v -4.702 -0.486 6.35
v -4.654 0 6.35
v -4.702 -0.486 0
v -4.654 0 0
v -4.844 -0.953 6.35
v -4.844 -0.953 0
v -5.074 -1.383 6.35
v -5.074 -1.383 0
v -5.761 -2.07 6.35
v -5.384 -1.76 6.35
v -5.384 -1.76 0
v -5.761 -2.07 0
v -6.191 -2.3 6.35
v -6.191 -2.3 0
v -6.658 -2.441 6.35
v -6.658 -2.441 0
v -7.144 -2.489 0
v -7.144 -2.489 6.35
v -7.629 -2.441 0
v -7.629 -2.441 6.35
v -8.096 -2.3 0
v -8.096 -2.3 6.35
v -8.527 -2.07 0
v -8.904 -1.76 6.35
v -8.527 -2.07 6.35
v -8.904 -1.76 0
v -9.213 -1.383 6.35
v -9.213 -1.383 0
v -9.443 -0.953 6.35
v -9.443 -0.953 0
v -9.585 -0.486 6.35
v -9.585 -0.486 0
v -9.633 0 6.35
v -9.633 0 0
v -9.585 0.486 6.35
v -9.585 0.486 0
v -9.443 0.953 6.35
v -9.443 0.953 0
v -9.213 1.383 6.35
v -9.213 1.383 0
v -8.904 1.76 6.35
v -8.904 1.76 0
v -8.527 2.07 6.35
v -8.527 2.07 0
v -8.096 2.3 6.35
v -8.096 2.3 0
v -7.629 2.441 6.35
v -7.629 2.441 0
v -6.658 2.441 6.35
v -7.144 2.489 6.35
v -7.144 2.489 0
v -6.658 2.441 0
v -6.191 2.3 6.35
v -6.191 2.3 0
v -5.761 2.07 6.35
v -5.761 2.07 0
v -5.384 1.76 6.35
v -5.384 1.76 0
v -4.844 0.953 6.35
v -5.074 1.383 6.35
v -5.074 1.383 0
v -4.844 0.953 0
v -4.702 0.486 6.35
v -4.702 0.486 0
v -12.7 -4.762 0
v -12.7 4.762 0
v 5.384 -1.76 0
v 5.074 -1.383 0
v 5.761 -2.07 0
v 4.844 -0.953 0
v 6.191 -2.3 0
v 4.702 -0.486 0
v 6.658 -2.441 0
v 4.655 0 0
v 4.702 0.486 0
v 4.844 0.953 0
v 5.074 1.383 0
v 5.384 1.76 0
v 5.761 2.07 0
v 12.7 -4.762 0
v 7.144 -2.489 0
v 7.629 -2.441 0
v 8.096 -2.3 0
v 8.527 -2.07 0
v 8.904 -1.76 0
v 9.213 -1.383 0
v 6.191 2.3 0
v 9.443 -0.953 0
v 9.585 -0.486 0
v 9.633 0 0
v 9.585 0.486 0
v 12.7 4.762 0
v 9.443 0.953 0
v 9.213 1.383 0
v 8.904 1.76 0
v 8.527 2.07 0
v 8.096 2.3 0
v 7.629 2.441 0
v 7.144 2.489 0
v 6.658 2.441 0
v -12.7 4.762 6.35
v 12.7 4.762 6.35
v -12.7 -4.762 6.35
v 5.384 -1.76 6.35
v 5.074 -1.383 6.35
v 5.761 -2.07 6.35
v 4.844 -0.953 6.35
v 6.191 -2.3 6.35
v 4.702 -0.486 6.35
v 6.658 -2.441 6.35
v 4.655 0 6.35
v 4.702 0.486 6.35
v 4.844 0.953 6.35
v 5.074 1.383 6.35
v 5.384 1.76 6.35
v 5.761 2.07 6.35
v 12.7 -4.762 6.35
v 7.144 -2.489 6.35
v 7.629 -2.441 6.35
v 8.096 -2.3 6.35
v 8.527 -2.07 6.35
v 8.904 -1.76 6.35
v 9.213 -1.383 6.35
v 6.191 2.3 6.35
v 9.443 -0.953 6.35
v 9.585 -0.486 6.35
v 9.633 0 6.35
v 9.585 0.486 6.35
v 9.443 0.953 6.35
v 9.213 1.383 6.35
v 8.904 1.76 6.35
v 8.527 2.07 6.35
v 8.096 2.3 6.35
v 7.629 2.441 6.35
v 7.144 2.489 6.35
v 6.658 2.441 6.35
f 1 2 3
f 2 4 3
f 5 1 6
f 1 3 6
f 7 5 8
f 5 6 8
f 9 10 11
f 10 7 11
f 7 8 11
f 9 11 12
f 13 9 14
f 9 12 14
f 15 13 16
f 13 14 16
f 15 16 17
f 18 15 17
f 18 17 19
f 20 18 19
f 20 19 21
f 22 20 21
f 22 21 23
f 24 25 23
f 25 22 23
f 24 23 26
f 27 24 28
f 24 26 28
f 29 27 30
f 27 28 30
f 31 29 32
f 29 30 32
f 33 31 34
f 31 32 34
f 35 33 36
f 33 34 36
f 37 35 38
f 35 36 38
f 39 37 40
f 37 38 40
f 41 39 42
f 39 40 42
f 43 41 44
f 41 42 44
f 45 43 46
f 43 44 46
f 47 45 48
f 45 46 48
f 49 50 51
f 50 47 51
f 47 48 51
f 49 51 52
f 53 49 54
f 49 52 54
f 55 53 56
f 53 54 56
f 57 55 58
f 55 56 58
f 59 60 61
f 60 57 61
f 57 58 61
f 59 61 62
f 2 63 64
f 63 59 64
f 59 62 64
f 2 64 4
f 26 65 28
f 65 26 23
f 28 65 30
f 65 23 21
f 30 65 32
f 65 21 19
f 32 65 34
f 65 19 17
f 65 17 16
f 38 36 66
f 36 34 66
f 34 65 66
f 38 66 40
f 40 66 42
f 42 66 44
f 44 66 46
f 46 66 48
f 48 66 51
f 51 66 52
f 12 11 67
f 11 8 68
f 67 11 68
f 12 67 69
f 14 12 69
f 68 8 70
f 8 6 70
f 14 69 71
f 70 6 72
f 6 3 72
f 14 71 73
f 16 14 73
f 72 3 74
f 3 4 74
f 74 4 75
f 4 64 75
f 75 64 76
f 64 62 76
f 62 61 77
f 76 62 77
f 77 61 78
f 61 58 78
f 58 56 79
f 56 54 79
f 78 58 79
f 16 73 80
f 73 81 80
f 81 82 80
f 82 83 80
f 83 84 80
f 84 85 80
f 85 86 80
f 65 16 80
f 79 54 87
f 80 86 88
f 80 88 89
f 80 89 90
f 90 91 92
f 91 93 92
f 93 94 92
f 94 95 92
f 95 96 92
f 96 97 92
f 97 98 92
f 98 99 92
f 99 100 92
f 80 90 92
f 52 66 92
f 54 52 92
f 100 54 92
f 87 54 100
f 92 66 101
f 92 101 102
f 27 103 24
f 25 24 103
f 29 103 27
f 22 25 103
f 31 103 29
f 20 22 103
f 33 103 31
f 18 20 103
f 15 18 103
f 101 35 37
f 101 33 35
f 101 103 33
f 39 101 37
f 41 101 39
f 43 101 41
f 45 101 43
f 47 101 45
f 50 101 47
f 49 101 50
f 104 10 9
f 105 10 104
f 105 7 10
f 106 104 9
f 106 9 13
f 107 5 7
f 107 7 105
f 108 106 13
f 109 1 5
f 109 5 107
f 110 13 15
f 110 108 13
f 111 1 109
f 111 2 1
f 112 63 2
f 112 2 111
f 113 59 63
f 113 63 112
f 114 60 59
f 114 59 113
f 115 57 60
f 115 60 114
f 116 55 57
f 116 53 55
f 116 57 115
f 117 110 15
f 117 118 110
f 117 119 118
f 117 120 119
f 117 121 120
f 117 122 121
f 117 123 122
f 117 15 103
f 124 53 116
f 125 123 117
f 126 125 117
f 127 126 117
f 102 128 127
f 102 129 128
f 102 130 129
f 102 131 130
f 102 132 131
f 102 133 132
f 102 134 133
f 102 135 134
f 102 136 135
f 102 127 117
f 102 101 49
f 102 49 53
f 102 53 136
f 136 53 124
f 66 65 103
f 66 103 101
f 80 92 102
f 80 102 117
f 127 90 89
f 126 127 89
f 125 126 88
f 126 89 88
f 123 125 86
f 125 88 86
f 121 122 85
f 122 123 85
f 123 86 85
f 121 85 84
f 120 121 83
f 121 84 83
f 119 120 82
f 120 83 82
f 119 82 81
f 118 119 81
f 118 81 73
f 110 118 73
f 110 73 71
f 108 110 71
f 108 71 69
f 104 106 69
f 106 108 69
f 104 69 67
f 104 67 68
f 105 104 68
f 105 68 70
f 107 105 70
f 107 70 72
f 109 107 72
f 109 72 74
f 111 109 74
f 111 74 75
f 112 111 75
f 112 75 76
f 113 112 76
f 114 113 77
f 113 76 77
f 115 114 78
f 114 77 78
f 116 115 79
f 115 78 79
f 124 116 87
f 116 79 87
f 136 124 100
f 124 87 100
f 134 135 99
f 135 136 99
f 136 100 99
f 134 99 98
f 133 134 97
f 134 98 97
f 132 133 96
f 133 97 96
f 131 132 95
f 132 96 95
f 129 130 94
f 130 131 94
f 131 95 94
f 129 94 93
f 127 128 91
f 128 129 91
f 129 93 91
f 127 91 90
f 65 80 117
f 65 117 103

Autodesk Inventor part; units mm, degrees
ref_plane "YZ Plane" through (0, 0, 0) normal (1, 0, 0) x (0, 1, 0)
ref_plane "XZ Plane" through (0, 0, 0) normal (0, 1, 0) x (-1, 0, 0)
ref_plane "XY Plane" through (0, 0, 0) normal (0, 0, 1) x (1, 0, 0)
sketch "Sketch1" plane through (0, 0, 0) normal (0, 0, 1) x (1, 0, 0)
  line L0 (12.7, -4.7625) -> (-12.7, -4.7625)
  line L1 (-12.7, -4.7625) -> (-12.7, 4.7625)
  line L2 (-12.7, 4.7625) -> (12.7, 4.7625)
  line L3 (12.7, 4.7625) -> (12.7, -4.7625)
  line L4 (12.7, -4.7625) -> (-12.7, 4.7625) construction
  line L5 (-12.7, -4.7625) -> (12.7, 4.7625) construction
  line L6 (-12.7, 0) -> (12.7, 0) construction
  circle A0 centre (-7.1437, 0) radius 2.4892
  line L7 (0, -4.7625) -> (0, 4.7625) construction
  circle A1 centre (7.1437, 0) radius 2.4892
  point P0 (0, 0)
  point P1 (0, 0)
  dimension "d0" = 25.4
  dimension "d1" = 9.525
  dimension "d2" = 4.9784
  dimension "d3" = 7.1437
extrude "Extrusion1" add sketch "Sketch1" along normal blind 6.35
properties part number "Arms" material "Aluminum 6061"
